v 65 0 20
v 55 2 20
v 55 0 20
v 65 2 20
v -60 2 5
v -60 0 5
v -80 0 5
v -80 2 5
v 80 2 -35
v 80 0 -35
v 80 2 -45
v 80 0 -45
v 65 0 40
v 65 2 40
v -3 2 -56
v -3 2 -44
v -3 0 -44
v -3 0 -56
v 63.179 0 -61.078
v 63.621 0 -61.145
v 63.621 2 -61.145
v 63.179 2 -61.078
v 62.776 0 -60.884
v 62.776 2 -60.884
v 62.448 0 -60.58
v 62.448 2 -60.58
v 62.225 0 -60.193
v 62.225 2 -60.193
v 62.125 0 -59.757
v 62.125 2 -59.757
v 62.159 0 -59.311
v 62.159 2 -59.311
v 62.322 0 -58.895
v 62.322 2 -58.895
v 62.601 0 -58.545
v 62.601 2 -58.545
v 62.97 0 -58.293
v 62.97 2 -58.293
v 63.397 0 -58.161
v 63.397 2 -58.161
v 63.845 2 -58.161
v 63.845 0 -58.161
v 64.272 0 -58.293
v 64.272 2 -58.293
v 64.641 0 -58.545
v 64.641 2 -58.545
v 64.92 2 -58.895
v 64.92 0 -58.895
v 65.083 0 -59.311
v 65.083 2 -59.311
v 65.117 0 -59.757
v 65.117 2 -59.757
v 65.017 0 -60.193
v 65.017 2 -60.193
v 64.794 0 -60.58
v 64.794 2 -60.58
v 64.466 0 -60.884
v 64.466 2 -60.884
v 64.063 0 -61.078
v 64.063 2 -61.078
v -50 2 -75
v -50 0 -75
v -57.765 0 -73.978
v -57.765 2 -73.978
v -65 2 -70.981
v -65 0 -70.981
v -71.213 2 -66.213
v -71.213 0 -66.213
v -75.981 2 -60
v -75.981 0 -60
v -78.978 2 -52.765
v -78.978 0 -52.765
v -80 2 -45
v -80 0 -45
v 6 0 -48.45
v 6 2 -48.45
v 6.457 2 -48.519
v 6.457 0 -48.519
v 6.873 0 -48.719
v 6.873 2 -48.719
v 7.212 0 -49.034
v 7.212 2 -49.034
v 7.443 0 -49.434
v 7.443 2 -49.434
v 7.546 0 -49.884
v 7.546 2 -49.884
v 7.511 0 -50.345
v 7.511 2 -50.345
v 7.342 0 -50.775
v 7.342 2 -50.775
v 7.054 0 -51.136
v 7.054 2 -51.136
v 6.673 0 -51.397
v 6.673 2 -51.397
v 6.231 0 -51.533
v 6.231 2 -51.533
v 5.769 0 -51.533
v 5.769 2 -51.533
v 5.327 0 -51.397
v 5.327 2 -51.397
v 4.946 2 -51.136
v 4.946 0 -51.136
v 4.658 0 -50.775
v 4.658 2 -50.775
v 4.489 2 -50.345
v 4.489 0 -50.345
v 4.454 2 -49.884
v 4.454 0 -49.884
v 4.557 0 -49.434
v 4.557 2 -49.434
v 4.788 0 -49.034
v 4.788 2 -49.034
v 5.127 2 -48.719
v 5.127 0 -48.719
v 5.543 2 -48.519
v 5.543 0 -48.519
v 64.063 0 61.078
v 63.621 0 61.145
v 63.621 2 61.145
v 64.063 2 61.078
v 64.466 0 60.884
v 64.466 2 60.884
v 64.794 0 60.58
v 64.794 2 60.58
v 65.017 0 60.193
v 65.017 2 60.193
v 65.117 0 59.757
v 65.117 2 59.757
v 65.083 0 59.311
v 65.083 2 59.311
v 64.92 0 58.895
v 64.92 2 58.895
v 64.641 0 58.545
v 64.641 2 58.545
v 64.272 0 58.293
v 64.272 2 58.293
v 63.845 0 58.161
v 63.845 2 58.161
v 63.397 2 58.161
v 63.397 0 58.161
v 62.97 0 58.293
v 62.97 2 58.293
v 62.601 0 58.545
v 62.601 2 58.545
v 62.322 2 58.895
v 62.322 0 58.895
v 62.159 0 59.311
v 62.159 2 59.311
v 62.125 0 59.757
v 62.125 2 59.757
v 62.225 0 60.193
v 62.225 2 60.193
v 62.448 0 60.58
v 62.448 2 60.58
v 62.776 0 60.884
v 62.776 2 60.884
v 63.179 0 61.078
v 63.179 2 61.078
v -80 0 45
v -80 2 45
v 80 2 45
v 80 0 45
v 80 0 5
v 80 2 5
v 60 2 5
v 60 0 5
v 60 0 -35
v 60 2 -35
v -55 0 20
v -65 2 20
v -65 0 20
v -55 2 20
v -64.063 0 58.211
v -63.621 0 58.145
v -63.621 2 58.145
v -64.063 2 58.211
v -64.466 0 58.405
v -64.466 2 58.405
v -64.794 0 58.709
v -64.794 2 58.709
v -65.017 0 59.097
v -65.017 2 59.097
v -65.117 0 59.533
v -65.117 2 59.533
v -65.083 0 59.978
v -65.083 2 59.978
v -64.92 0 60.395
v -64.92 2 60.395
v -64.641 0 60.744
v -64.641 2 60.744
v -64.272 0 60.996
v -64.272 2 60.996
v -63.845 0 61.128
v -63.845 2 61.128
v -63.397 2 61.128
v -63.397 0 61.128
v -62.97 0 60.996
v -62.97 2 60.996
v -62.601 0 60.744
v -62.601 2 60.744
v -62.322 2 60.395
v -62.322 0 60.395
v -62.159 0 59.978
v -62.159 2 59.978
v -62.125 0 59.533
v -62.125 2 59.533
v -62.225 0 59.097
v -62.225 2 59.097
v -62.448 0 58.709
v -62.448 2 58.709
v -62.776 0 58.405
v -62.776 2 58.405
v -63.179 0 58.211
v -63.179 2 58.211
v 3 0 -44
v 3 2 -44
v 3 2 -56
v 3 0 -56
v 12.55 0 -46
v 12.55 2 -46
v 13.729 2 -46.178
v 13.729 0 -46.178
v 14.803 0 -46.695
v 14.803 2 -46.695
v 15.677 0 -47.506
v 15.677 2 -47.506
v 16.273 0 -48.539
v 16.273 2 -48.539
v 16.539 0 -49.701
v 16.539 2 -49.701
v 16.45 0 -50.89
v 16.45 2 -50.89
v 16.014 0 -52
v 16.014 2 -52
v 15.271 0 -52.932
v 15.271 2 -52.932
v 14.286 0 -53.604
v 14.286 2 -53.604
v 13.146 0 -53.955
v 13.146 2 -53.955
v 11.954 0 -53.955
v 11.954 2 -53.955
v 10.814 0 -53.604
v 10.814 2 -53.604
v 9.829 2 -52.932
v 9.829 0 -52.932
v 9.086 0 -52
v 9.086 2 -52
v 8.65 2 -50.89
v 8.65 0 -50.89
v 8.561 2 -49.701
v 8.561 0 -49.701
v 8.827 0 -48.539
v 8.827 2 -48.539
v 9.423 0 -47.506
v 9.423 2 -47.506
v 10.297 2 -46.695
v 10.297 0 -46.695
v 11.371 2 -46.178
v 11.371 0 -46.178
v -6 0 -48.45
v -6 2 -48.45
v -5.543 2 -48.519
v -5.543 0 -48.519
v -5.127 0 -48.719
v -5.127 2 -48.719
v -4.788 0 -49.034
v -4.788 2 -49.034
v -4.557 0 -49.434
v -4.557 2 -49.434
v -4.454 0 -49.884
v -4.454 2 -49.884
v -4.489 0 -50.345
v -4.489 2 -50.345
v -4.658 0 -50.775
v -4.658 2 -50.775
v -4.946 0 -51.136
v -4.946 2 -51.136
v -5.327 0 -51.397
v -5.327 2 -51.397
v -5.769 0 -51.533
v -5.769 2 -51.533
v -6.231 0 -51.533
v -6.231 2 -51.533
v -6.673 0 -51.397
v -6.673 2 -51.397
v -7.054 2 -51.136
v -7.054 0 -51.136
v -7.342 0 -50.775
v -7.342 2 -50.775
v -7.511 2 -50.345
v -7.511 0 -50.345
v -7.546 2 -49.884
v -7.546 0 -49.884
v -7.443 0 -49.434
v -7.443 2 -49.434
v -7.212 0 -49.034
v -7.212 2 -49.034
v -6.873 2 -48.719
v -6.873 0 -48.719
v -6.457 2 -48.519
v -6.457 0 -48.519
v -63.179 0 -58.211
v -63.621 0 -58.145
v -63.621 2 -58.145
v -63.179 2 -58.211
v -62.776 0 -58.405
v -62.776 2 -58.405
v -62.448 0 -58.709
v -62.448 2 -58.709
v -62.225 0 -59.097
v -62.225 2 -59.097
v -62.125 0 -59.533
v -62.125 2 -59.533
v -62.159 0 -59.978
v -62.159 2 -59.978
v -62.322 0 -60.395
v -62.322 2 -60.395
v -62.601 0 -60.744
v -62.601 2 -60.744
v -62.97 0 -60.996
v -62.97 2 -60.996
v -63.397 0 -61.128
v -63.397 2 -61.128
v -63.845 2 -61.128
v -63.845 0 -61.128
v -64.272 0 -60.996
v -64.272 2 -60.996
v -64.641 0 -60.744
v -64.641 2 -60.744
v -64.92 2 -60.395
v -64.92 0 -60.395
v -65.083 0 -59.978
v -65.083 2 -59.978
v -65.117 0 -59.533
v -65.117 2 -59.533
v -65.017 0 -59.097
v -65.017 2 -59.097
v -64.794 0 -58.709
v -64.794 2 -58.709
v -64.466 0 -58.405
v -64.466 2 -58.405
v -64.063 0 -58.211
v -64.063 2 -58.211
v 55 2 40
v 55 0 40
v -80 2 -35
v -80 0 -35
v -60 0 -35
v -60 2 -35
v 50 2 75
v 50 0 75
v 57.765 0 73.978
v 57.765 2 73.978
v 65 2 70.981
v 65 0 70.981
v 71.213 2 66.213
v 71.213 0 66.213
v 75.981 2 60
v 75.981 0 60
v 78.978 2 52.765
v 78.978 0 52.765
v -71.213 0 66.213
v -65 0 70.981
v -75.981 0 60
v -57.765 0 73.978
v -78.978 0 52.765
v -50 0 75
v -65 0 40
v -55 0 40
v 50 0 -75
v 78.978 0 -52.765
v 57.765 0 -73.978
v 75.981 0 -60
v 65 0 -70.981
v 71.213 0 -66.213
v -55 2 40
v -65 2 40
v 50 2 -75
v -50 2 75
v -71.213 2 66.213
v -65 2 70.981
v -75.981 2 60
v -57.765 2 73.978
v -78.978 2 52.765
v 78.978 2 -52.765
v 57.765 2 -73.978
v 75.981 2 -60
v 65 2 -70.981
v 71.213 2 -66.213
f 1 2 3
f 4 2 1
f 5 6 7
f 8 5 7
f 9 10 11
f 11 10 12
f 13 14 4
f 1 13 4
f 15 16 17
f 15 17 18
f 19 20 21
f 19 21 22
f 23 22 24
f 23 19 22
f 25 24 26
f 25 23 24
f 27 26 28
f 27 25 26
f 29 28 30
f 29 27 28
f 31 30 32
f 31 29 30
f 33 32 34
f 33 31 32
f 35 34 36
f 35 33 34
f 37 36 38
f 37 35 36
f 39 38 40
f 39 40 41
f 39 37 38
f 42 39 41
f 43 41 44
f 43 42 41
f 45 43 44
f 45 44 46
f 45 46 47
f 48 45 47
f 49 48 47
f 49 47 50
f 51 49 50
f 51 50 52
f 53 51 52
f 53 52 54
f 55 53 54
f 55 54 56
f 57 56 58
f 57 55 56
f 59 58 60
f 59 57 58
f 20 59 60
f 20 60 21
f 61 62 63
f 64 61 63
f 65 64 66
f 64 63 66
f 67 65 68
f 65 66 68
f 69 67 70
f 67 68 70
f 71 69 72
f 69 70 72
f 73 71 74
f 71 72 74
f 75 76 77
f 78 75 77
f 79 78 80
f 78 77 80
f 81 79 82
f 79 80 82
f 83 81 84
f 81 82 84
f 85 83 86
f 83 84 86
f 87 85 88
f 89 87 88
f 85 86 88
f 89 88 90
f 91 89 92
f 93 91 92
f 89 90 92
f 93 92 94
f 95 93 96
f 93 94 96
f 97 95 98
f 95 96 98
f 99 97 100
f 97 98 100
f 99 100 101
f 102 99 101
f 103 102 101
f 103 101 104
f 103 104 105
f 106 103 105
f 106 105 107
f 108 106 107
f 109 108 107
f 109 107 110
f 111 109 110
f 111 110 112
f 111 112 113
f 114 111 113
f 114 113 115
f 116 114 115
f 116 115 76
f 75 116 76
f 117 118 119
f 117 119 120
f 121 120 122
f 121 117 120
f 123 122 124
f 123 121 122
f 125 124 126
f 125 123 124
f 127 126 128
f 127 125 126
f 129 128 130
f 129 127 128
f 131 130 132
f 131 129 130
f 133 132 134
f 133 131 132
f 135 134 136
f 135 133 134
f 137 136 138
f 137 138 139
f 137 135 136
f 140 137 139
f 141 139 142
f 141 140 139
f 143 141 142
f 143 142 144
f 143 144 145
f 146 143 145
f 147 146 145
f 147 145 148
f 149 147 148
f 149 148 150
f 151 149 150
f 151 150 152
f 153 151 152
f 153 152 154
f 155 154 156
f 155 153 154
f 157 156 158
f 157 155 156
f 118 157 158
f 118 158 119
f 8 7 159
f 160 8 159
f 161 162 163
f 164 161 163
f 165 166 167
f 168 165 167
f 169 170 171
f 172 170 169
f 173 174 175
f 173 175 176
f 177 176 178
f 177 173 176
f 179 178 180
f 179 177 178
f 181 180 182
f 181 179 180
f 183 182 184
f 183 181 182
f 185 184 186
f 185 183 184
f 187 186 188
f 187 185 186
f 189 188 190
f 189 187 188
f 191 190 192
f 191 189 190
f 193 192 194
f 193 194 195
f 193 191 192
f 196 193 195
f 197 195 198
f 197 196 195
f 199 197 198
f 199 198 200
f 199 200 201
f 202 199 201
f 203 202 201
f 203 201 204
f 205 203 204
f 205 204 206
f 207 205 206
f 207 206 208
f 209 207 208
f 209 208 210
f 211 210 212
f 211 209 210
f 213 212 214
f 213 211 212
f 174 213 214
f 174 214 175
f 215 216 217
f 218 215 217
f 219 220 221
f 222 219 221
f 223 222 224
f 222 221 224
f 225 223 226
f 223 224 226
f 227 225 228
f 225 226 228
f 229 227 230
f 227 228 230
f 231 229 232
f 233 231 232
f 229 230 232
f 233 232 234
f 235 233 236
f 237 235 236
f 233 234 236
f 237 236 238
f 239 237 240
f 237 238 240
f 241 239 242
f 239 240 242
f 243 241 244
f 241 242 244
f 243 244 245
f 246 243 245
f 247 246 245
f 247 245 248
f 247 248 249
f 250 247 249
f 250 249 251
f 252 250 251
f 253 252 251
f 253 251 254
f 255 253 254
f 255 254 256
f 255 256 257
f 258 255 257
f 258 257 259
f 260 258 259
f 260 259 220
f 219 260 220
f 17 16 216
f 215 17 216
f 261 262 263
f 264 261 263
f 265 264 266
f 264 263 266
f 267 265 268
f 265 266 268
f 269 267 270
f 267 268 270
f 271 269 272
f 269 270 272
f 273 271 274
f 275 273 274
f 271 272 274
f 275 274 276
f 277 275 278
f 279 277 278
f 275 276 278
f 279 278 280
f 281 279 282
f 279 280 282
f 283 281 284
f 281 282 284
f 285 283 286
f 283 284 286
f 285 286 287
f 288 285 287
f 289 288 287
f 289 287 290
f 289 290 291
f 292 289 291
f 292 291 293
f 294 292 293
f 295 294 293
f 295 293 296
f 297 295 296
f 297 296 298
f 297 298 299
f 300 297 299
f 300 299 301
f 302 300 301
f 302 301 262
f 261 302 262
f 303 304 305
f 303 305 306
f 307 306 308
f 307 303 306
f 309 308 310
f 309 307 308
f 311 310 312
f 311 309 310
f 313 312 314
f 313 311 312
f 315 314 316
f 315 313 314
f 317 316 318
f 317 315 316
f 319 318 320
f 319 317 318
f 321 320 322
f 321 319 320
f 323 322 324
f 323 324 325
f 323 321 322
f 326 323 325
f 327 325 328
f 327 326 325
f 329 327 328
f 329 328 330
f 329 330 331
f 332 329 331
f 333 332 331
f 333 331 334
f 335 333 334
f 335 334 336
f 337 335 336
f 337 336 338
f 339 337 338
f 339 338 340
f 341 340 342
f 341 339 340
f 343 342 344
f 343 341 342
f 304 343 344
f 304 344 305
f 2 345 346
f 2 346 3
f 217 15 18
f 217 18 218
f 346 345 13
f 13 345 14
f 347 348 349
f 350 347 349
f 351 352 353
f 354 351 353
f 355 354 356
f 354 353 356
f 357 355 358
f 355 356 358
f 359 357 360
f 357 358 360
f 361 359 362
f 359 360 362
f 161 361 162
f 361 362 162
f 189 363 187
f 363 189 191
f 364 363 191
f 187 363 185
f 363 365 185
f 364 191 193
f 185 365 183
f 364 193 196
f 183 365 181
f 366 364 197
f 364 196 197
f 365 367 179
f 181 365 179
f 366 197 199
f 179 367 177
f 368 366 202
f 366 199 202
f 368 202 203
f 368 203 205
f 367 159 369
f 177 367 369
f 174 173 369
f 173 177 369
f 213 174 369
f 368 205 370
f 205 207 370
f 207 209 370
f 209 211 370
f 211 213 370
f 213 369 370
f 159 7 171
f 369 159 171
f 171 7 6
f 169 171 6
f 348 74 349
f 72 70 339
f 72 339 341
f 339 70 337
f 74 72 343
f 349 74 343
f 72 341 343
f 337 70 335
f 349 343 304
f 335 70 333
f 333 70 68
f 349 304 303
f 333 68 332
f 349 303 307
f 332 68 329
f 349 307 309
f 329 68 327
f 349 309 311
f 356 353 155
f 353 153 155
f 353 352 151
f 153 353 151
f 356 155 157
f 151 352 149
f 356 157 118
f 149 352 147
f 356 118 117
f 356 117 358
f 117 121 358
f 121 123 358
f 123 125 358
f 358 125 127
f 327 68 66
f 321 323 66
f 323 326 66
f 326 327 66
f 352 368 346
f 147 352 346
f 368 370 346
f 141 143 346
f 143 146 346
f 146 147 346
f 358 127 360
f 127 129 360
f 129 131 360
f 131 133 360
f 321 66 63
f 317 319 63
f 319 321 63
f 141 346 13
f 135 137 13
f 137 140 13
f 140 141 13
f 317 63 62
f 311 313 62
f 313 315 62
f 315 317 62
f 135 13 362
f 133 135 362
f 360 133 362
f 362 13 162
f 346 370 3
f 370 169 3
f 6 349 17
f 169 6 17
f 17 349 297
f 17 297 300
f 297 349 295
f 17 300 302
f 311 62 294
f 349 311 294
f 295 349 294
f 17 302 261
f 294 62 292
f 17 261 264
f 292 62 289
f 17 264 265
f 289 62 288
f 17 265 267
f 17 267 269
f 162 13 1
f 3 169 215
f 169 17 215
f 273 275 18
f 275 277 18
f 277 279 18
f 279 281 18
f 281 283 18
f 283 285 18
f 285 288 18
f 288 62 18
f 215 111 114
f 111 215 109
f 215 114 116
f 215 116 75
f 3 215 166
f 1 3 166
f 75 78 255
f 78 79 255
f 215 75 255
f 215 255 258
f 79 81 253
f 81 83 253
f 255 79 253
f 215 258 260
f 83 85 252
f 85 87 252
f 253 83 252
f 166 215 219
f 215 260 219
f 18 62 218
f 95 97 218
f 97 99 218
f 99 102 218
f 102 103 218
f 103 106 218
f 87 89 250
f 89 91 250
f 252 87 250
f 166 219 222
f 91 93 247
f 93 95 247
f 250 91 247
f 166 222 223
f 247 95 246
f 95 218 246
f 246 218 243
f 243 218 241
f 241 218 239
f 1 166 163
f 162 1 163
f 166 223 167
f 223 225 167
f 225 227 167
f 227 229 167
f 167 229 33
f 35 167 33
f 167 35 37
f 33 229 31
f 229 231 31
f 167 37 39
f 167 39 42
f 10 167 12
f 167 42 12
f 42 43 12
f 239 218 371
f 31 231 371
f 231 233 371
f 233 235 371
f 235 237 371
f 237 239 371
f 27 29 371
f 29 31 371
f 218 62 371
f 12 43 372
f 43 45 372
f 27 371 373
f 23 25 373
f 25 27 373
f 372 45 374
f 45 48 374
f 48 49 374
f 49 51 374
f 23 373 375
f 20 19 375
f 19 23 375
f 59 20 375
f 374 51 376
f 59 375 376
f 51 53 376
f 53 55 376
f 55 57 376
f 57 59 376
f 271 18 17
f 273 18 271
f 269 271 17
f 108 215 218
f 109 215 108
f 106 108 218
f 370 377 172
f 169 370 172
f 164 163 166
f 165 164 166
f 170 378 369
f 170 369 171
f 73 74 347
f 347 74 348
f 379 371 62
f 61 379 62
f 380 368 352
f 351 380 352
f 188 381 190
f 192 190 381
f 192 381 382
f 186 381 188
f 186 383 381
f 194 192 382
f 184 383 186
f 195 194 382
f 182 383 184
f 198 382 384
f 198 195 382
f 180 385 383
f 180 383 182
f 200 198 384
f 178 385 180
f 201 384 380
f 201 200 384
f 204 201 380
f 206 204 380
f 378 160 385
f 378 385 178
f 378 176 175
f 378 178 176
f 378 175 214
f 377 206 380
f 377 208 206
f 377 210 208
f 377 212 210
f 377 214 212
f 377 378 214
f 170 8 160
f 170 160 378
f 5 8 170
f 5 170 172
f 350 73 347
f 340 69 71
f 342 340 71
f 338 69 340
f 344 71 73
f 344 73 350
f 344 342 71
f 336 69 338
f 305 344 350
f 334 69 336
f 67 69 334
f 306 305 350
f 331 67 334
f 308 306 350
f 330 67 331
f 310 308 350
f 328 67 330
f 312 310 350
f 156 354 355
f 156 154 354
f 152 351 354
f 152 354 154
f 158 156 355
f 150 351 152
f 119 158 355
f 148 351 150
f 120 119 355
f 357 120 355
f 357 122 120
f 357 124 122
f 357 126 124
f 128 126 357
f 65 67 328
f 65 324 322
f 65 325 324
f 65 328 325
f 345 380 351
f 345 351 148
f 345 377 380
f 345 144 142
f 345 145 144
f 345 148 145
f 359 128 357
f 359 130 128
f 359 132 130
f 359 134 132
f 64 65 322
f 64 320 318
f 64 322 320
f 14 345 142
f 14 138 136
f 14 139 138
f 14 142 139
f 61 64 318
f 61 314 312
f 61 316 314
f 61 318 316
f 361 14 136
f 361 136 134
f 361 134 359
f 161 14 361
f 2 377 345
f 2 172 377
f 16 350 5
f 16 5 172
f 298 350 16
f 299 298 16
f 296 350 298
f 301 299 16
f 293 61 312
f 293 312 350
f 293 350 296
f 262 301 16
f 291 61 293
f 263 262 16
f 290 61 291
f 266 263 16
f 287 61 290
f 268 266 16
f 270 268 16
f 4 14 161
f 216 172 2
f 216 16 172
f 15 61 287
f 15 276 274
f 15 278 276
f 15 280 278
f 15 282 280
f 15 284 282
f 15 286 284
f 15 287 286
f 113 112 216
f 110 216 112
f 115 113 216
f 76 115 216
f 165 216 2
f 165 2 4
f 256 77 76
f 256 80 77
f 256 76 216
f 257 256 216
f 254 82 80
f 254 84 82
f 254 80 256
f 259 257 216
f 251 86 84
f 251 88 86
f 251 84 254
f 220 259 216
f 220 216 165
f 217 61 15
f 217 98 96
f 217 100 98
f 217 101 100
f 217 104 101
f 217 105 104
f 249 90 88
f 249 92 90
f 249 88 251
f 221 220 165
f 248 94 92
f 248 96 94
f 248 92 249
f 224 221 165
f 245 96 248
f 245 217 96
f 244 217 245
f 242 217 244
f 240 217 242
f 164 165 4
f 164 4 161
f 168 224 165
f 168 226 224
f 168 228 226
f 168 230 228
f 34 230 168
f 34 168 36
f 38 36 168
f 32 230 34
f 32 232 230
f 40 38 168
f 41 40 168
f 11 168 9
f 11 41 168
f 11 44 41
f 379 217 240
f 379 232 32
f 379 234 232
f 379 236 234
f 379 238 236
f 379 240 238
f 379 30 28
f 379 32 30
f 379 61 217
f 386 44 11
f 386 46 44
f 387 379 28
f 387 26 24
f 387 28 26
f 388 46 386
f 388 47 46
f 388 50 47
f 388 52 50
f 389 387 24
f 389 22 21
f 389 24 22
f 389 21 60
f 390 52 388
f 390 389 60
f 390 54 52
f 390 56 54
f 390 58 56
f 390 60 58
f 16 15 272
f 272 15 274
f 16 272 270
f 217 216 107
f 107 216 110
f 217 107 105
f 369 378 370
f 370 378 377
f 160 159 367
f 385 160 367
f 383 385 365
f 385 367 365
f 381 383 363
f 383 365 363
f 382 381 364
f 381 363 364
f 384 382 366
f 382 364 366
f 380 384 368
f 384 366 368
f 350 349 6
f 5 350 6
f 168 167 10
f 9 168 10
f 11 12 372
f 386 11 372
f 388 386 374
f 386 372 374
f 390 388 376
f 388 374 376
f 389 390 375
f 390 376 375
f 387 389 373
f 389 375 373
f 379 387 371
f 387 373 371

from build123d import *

# Parameters (mm, degrees)
SKETCH1_R           = 1.5
BOSS_EXTRUDE1_DEPTH = 2
SKETCH2_R           = 1.55
SKETCH2_R_2         = 4
SKETCH2_W           = 6
SKETCH2_H           = 12
CUT_EXTRUDE1_DEPTH  = 10
SKETCH3_W           = 10
SKETCH3_H           = 20
CUT_EXTRUDE2_DEPTH  = 10


with BuildPart() as part:
    # Sketch1 → Boss-Extrude1 (new body)
    with BuildSketch(Plane(origin=(0, 0, 0), x_dir=(1, 0, 0), z_dir=(0, 1, 0))):
        with BuildLine():
            Line((-80, 35), (-60, 35))
            Line((-60, 35), (-60, -5))
            Line((-60, -5), (-80, -5))
            Line((-80, -5), (-80, -45))
            ThreePointArc((-80, -45), (-71.213203436, -66.213203436), (-50, -75))
            Line((-50, -75), (50, -75))
            ThreePointArc((50, -75), (71.213203436, -66.213203436), (80, -45))
            Line((80, -45), (80, -5))
            Line((80, -5), (60, -5))
            Line((60, -5), (60, 35))
            Line((60, 35), (80, 35))
            Line((80, 35), (80, 45))
            ThreePointArc((80, 45), (71.213203436, 66.213203436), (50, 75))
            Line((50, 75), (-50, 75))
            ThreePointArc((-50, 75), (-71.213203436, 66.213203436), (-80, 45))
            Line((-80, 45), (-80, 35))
        make_face()
        with Locations(Location((-63.621027185, 59.644712986, 0), (0, 0, 270))):
            Circle(SKETCH1_R, mode=Mode.SUBTRACT)
        with Locations(Location((63.621027185, 59.644712986, 0), (0, 0, 90))):
            Circle(SKETCH1_R, mode=Mode.SUBTRACT)
        with Locations(Location((63.621027185, -59.644712986, 0), (0, 0, 270))):
            Circle(SKETCH1_R, mode=Mode.SUBTRACT)
        with Locations(Location((-63.621027185, -59.644712986, 0), (0, 0, 90))):
            Circle(SKETCH1_R, mode=Mode.SUBTRACT)
    extrude(amount=BOSS_EXTRUDE1_DEPTH)

    # Sketch2 → Cut-Extrude1 (cut)
    with BuildSketch(Plane(origin=(0, 2, 0), x_dir=(1, 0, 0), z_dir=(0, 1, 0))):
        with Locations(Location((-6, 50, 0), (0, 0, 270))):
            Circle(SKETCH2_R)
        with Locations(Location((6, 50, 0), (0, 0, 270))):
            Circle(SKETCH2_R)
        with Locations(Location((12.55, 50, 0), (0, 0, 270))):
            Circle(SKETCH2_R_2)
        with Locations((0, 50)):
            Rectangle(SKETCH2_W, SKETCH2_H)
    extrude(amount=-CUT_EXTRUDE1_DEPTH, mode=Mode.SUBTRACT)

    # Sketch3 → Cut-Extrude2 (cut)
    with BuildSketch(Plane(origin=(0, 2, 0), x_dir=(1, 0, 0), z_dir=(0, 1, 0))):
        with Locations((-60, -30)):
            Rectangle(SKETCH3_W, SKETCH3_H)
        with Locations((60, -30)):
            Rectangle(SKETCH3_W, SKETCH3_H)
    extrude(amount=-CUT_EXTRUDE2_DEPTH, mode=Mode.SUBTRACT)


solid = part.part
